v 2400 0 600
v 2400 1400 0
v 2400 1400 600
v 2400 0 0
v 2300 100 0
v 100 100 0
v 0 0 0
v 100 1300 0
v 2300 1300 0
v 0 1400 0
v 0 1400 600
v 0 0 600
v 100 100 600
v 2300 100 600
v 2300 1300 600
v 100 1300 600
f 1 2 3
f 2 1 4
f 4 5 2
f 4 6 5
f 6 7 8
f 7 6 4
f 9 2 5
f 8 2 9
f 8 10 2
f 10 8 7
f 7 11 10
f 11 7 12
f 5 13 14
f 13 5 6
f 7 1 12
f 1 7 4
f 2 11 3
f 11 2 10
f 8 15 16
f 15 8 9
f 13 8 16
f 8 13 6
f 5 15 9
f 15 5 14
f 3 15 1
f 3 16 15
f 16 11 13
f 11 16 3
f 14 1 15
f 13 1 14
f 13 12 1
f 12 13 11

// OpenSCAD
// Generated from plan.json; millimetres. Not a structural design.
// Open in OpenSCAD. Increase explode_mm to inspect courses.
explode_mm = 0;
$fn = 24;
show_fixing_paths = false;

// first-bed-01-C1-S
translate([0, 0, 0+0*explode_mm])
  color([0.70,0.52,0.33]) cube([2400, 100, 200]);
// first-bed-01-C1-N
translate([0, 1300, 0+0*explode_mm])
  color([0.70,0.52,0.33]) cube([2400, 100, 200]);
// first-bed-01-C1-W
translate([0, 100, 0+0*explode_mm])
  color([0.70,0.52,0.33]) cube([100, 1200, 200]);
// first-bed-01-C1-E
translate([2300, 100, 0+0*explode_mm])
  color([0.70,0.52,0.33]) cube([100, 1200, 200]);
// first-bed-01-C2-S
translate([100, 0, 200+1*explode_mm])
  color([0.70,0.52,0.33]) cube([2200, 100, 200]);
// first-bed-01-C2-N
translate([100, 1300, 200+1*explode_mm])
  color([0.70,0.52,0.33]) cube([2200, 100, 200]);
// first-bed-01-C2-W
translate([0, 0, 200+1*explode_mm])
  color([0.70,0.52,0.33]) cube([100, 1400, 200]);
// first-bed-01-C2-E
translate([2300, 0, 200+1*explode_mm])
  color([0.70,0.52,0.33]) cube([100, 1400, 200]);
// first-bed-01-C3-S
translate([0, 0, 400+2*explode_mm])
  color([0.70,0.52,0.33]) cube([2400, 100, 200]);
// first-bed-01-C3-N
translate([0, 1300, 400+2*explode_mm])
  color([0.70,0.52,0.33]) cube([2400, 100, 200]);
// first-bed-01-C3-W
translate([0, 100, 400+2*explode_mm])
  color([0.70,0.52,0.33]) cube([100, 1200, 200]);
// first-bed-01-C3-E
translate([2300, 100, 400+2*explode_mm])
  color([0.70,0.52,0.33]) cube([100, 1200, 200]);
if (show_fixing_paths) translate([50.0, 1400, 50.0+0*explode_mm]) rotate([90,0,0]) color([0.8,0.1,0.1]) cylinder(d=7, h=150);
if (show_fixing_paths) translate([50.0, 1400, 150.0+0*explode_mm]) rotate([90,0,0]) color([0.8,0.1,0.1]) cylinder(d=7, h=150);
if (show_fixing_paths) translate([2350.0, 1400, 50.0+0*explode_mm]) rotate([90,0,0]) color([0.8,0.1,0.1]) cylinder(d=7, h=150);
if (show_fixing_paths) translate([2350.0, 1400, 150.0+0*explode_mm]) rotate([90,0,0]) color([0.8,0.1,0.1]) cylinder(d=7, h=150);
if (show_fixing_paths) translate([50.0, 0, 50.0+0*explode_mm]) rotate([-90,0,0]) color([0.8,0.1,0.1]) cylinder(d=7, h=150);
if (show_fixing_paths) translate([50.0, 0, 150.0+0*explode_mm]) rotate([-90,0,0]) color([0.8,0.1,0.1]) cylinder(d=7, h=150);
if (show_fixing_paths) translate([2350.0, 0, 50.0+0*explode_mm]) rotate([-90,0,0]) color([0.8,0.1,0.1]) cylinder(d=7, h=150);
if (show_fixing_paths) translate([2350.0, 0, 150.0+0*explode_mm]) rotate([-90,0,0]) color([0.8,0.1,0.1]) cylinder(d=7, h=150);
if (show_fixing_paths) translate([2400, 50.0, 250.0+1*explode_mm]) rotate([0,-90,0]) color([0.8,0.1,0.1]) cylinder(d=7, h=150);
if (show_fixing_paths) translate([2400, 50.0, 350.0+1*explode_mm]) rotate([0,-90,0]) color([0.8,0.1,0.1]) cylinder(d=7, h=150);
if (show_fixing_paths) translate([2400, 1350.0, 250.0+1*explode_mm]) rotate([0,-90,0]) color([0.8,0.1,0.1]) cylinder(d=7, h=150);
if (show_fixing_paths) translate([2400, 1350.0, 350.0+1*explode_mm]) rotate([0,-90,0]) color([0.8,0.1,0.1]) cylinder(d=7, h=150);
if (show_fixing_paths) translate([2350.0, 200.0, 400+1*explode_mm]) rotate([180,0,0]) color([0.8,0.1,0.1]) cylinder(d=7, h=250);
if (show_fixing_paths) translate([2350.0, 700.0, 400+1*explode_mm]) rotate([180,0,0]) color([0.8,0.1,0.1]) cylinder(d=7, h=250);
if (show_fixing_paths) translate([2350.0, 1200.0, 400+1*explode_mm]) rotate([180,0,0]) color([0.8,0.1,0.1]) cylinder(d=7, h=250);
if (show_fixing_paths) translate([300.0, 1350.0, 400+1*explode_mm]) rotate([180,0,0]) color([0.8,0.1,0.1]) cylinder(d=7, h=250);
if (show_fixing_paths) translate([900.0, 1350.0, 400+1*explode_mm]) rotate([180,0,0]) color([0.8,0.1,0.1]) cylinder(d=7, h=250);
if (show_fixing_paths) translate([1500.0, 1350.0, 400+1*explode_mm]) rotate([180,0,0]) color([0.8,0.1,0.1]) cylinder(d=7, h=250);
if (show_fixing_paths) translate([2100.0, 1350.0, 400+1*explode_mm]) rotate([180,0,0]) color([0.8,0.1,0.1]) cylinder(d=7, h=250);
if (show_fixing_paths) translate([300.0, 50.0, 400+1*explode_mm]) rotate([180,0,0]) color([0.8,0.1,0.1]) cylinder(d=7, h=250);
if (show_fixing_paths) translate([900.0, 50.0, 400+1*explode_mm]) rotate([180,0,0]) color([0.8,0.1,0.1]) cylinder(d=7, h=250);
if (show_fixing_paths) translate([1500.0, 50.0, 400+1*explode_mm]) rotate([180,0,0]) color([0.8,0.1,0.1]) cylinder(d=7, h=250);
if (show_fixing_paths) translate([2100.0, 50.0, 400+1*explode_mm]) rotate([180,0,0]) color([0.8,0.1,0.1]) cylinder(d=7, h=250);
if (show_fixing_paths) translate([0, 50.0, 250.0+1*explode_mm]) rotate([0,90,0]) color([0.8,0.1,0.1]) cylinder(d=7, h=150);
if (show_fixing_paths) translate([0, 50.0, 350.0+1*explode_mm]) rotate([0,90,0]) color([0.8,0.1,0.1]) cylinder(d=7, h=150);
if (show_fixing_paths) translate([0, 1350.0, 250.0+1*explode_mm]) rotate([0,90,0]) color([0.8,0.1,0.1]) cylinder(d=7, h=150);
if (show_fixing_paths) translate([0, 1350.0, 350.0+1*explode_mm]) rotate([0,90,0]) color([0.8,0.1,0.1]) cylinder(d=7, h=150);
if (show_fixing_paths) translate([50.0, 200.0, 400+1*explode_mm]) rotate([180,0,0]) color([0.8,0.1,0.1]) cylinder(d=7, h=250);
if (show_fixing_paths) translate([50.0, 700.0, 400+1*explode_mm]) rotate([180,0,0]) color([0.8,0.1,0.1]) cylinder(d=7, h=250);
if (show_fixing_paths) translate([50.0, 1200.0, 400+1*explode_mm]) rotate([180,0,0]) color([0.8,0.1,0.1]) cylinder(d=7, h=250);
if (show_fixing_paths) translate([2350.0, 340.0, 600+2*explode_mm]) rotate([180,0,0]) color([0.8,0.1,0.1]) cylinder(d=7, h=250);
if (show_fixing_paths) translate([2350.0, 740.0, 600+2*explode_mm]) rotate([180,0,0]) color([0.8,0.1,0.1]) cylinder(d=7, h=250);
if (show_fixing_paths) translate([2350.0, 1140.0, 600+2*explode_mm]) rotate([180,0,0]) color([0.8,0.1,0.1]) cylinder(d=7, h=250);
if (show_fixing_paths) translate([50.0, 1400, 450.0+2*explode_mm]) rotate([90,0,0]) color([0.8,0.1,0.1]) cylinder(d=7, h=150);
if (show_fixing_paths) translate([50.0, 1400, 550.0+2*explode_mm]) rotate([90,0,0]) color([0.8,0.1,0.1]) cylinder(d=7, h=150);
if (show_fixing_paths) translate([2350.0, 1400, 450.0+2*explode_mm]) rotate([90,0,0]) color([0.8,0.1,0.1]) cylinder(d=7, h=150);
if (show_fixing_paths) translate([2350.0, 1400, 550.0+2*explode_mm]) rotate([90,0,0]) color([0.8,0.1,0.1]) cylinder(d=7, h=150);
if (show_fixing_paths) translate([240.0, 1350.0, 600+2*explode_mm]) rotate([180,0,0]) color([0.8,0.1,0.1]) cylinder(d=7, h=250);
if (show_fixing_paths) translate([740.0, 1350.0, 600+2*explode_mm]) rotate([180,0,0]) color([0.8,0.1,0.1]) cylinder(d=7, h=250);
if (show_fixing_paths) translate([1240.0, 1350.0, 600+2*explode_mm]) rotate([180,0,0]) color([0.8,0.1,0.1]) cylinder(d=7, h=250);
if (show_fixing_paths) translate([1740.0, 1350.0, 600+2*explode_mm]) rotate([180,0,0]) color([0.8,0.1,0.1]) cylinder(d=7, h=250);
if (show_fixing_paths) translate([2220.0, 1350.0, 600+2*explode_mm]) rotate([180,0,0]) color([0.8,0.1,0.1]) cylinder(d=7, h=250);
if (show_fixing_paths) translate([50.0, 0, 450.0+2*explode_mm]) rotate([-90,0,0]) color([0.8,0.1,0.1]) cylinder(d=7, h=150);
if (show_fixing_paths) translate([50.0, 0, 550.0+2*explode_mm]) rotate([-90,0,0]) color([0.8,0.1,0.1]) cylinder(d=7, h=150);
if (show_fixing_paths) translate([2350.0, 0, 450.0+2*explode_mm]) rotate([-90,0,0]) color([0.8,0.1,0.1]) cylinder(d=7, h=150);
if (show_fixing_paths) translate([2350.0, 0, 550.0+2*explode_mm]) rotate([-90,0,0]) color([0.8,0.1,0.1]) cylinder(d=7, h=150);
if (show_fixing_paths) translate([240.0, 50.0, 600+2*explode_mm]) rotate([180,0,0]) color([0.8,0.1,0.1]) cylinder(d=7, h=250);
if (show_fixing_paths) translate([740.0, 50.0, 600+2*explode_mm]) rotate([180,0,0]) color([0.8,0.1,0.1]) cylinder(d=7, h=250);
if (show_fixing_paths) translate([1240.0, 50.0, 600+2*explode_mm]) rotate([180,0,0]) color([0.8,0.1,0.1]) cylinder(d=7, h=250);
if (show_fixing_paths) translate([1740.0, 50.0, 600+2*explode_mm]) rotate([180,0,0]) color([0.8,0.1,0.1]) cylinder(d=7, h=250);
if (show_fixing_paths) translate([2220.0, 50.0, 600+2*explode_mm]) rotate([180,0,0]) color([0.8,0.1,0.1]) cylinder(d=7, h=250);
if (show_fixing_paths) translate([50.0, 340.0, 600+2*explode_mm]) rotate([180,0,0]) color([0.8,0.1,0.1]) cylinder(d=7, h=250);
if (show_fixing_paths) translate([50.0, 740.0, 600+2*explode_mm]) rotate([180,0,0]) color([0.8,0.1,0.1]) cylinder(d=7, h=250);
if (show_fixing_paths) translate([50.0, 1140.0, 600+2*explode_mm]) rotate([180,0,0]) color([0.8,0.1,0.1]) cylinder(d=7, h=250);
